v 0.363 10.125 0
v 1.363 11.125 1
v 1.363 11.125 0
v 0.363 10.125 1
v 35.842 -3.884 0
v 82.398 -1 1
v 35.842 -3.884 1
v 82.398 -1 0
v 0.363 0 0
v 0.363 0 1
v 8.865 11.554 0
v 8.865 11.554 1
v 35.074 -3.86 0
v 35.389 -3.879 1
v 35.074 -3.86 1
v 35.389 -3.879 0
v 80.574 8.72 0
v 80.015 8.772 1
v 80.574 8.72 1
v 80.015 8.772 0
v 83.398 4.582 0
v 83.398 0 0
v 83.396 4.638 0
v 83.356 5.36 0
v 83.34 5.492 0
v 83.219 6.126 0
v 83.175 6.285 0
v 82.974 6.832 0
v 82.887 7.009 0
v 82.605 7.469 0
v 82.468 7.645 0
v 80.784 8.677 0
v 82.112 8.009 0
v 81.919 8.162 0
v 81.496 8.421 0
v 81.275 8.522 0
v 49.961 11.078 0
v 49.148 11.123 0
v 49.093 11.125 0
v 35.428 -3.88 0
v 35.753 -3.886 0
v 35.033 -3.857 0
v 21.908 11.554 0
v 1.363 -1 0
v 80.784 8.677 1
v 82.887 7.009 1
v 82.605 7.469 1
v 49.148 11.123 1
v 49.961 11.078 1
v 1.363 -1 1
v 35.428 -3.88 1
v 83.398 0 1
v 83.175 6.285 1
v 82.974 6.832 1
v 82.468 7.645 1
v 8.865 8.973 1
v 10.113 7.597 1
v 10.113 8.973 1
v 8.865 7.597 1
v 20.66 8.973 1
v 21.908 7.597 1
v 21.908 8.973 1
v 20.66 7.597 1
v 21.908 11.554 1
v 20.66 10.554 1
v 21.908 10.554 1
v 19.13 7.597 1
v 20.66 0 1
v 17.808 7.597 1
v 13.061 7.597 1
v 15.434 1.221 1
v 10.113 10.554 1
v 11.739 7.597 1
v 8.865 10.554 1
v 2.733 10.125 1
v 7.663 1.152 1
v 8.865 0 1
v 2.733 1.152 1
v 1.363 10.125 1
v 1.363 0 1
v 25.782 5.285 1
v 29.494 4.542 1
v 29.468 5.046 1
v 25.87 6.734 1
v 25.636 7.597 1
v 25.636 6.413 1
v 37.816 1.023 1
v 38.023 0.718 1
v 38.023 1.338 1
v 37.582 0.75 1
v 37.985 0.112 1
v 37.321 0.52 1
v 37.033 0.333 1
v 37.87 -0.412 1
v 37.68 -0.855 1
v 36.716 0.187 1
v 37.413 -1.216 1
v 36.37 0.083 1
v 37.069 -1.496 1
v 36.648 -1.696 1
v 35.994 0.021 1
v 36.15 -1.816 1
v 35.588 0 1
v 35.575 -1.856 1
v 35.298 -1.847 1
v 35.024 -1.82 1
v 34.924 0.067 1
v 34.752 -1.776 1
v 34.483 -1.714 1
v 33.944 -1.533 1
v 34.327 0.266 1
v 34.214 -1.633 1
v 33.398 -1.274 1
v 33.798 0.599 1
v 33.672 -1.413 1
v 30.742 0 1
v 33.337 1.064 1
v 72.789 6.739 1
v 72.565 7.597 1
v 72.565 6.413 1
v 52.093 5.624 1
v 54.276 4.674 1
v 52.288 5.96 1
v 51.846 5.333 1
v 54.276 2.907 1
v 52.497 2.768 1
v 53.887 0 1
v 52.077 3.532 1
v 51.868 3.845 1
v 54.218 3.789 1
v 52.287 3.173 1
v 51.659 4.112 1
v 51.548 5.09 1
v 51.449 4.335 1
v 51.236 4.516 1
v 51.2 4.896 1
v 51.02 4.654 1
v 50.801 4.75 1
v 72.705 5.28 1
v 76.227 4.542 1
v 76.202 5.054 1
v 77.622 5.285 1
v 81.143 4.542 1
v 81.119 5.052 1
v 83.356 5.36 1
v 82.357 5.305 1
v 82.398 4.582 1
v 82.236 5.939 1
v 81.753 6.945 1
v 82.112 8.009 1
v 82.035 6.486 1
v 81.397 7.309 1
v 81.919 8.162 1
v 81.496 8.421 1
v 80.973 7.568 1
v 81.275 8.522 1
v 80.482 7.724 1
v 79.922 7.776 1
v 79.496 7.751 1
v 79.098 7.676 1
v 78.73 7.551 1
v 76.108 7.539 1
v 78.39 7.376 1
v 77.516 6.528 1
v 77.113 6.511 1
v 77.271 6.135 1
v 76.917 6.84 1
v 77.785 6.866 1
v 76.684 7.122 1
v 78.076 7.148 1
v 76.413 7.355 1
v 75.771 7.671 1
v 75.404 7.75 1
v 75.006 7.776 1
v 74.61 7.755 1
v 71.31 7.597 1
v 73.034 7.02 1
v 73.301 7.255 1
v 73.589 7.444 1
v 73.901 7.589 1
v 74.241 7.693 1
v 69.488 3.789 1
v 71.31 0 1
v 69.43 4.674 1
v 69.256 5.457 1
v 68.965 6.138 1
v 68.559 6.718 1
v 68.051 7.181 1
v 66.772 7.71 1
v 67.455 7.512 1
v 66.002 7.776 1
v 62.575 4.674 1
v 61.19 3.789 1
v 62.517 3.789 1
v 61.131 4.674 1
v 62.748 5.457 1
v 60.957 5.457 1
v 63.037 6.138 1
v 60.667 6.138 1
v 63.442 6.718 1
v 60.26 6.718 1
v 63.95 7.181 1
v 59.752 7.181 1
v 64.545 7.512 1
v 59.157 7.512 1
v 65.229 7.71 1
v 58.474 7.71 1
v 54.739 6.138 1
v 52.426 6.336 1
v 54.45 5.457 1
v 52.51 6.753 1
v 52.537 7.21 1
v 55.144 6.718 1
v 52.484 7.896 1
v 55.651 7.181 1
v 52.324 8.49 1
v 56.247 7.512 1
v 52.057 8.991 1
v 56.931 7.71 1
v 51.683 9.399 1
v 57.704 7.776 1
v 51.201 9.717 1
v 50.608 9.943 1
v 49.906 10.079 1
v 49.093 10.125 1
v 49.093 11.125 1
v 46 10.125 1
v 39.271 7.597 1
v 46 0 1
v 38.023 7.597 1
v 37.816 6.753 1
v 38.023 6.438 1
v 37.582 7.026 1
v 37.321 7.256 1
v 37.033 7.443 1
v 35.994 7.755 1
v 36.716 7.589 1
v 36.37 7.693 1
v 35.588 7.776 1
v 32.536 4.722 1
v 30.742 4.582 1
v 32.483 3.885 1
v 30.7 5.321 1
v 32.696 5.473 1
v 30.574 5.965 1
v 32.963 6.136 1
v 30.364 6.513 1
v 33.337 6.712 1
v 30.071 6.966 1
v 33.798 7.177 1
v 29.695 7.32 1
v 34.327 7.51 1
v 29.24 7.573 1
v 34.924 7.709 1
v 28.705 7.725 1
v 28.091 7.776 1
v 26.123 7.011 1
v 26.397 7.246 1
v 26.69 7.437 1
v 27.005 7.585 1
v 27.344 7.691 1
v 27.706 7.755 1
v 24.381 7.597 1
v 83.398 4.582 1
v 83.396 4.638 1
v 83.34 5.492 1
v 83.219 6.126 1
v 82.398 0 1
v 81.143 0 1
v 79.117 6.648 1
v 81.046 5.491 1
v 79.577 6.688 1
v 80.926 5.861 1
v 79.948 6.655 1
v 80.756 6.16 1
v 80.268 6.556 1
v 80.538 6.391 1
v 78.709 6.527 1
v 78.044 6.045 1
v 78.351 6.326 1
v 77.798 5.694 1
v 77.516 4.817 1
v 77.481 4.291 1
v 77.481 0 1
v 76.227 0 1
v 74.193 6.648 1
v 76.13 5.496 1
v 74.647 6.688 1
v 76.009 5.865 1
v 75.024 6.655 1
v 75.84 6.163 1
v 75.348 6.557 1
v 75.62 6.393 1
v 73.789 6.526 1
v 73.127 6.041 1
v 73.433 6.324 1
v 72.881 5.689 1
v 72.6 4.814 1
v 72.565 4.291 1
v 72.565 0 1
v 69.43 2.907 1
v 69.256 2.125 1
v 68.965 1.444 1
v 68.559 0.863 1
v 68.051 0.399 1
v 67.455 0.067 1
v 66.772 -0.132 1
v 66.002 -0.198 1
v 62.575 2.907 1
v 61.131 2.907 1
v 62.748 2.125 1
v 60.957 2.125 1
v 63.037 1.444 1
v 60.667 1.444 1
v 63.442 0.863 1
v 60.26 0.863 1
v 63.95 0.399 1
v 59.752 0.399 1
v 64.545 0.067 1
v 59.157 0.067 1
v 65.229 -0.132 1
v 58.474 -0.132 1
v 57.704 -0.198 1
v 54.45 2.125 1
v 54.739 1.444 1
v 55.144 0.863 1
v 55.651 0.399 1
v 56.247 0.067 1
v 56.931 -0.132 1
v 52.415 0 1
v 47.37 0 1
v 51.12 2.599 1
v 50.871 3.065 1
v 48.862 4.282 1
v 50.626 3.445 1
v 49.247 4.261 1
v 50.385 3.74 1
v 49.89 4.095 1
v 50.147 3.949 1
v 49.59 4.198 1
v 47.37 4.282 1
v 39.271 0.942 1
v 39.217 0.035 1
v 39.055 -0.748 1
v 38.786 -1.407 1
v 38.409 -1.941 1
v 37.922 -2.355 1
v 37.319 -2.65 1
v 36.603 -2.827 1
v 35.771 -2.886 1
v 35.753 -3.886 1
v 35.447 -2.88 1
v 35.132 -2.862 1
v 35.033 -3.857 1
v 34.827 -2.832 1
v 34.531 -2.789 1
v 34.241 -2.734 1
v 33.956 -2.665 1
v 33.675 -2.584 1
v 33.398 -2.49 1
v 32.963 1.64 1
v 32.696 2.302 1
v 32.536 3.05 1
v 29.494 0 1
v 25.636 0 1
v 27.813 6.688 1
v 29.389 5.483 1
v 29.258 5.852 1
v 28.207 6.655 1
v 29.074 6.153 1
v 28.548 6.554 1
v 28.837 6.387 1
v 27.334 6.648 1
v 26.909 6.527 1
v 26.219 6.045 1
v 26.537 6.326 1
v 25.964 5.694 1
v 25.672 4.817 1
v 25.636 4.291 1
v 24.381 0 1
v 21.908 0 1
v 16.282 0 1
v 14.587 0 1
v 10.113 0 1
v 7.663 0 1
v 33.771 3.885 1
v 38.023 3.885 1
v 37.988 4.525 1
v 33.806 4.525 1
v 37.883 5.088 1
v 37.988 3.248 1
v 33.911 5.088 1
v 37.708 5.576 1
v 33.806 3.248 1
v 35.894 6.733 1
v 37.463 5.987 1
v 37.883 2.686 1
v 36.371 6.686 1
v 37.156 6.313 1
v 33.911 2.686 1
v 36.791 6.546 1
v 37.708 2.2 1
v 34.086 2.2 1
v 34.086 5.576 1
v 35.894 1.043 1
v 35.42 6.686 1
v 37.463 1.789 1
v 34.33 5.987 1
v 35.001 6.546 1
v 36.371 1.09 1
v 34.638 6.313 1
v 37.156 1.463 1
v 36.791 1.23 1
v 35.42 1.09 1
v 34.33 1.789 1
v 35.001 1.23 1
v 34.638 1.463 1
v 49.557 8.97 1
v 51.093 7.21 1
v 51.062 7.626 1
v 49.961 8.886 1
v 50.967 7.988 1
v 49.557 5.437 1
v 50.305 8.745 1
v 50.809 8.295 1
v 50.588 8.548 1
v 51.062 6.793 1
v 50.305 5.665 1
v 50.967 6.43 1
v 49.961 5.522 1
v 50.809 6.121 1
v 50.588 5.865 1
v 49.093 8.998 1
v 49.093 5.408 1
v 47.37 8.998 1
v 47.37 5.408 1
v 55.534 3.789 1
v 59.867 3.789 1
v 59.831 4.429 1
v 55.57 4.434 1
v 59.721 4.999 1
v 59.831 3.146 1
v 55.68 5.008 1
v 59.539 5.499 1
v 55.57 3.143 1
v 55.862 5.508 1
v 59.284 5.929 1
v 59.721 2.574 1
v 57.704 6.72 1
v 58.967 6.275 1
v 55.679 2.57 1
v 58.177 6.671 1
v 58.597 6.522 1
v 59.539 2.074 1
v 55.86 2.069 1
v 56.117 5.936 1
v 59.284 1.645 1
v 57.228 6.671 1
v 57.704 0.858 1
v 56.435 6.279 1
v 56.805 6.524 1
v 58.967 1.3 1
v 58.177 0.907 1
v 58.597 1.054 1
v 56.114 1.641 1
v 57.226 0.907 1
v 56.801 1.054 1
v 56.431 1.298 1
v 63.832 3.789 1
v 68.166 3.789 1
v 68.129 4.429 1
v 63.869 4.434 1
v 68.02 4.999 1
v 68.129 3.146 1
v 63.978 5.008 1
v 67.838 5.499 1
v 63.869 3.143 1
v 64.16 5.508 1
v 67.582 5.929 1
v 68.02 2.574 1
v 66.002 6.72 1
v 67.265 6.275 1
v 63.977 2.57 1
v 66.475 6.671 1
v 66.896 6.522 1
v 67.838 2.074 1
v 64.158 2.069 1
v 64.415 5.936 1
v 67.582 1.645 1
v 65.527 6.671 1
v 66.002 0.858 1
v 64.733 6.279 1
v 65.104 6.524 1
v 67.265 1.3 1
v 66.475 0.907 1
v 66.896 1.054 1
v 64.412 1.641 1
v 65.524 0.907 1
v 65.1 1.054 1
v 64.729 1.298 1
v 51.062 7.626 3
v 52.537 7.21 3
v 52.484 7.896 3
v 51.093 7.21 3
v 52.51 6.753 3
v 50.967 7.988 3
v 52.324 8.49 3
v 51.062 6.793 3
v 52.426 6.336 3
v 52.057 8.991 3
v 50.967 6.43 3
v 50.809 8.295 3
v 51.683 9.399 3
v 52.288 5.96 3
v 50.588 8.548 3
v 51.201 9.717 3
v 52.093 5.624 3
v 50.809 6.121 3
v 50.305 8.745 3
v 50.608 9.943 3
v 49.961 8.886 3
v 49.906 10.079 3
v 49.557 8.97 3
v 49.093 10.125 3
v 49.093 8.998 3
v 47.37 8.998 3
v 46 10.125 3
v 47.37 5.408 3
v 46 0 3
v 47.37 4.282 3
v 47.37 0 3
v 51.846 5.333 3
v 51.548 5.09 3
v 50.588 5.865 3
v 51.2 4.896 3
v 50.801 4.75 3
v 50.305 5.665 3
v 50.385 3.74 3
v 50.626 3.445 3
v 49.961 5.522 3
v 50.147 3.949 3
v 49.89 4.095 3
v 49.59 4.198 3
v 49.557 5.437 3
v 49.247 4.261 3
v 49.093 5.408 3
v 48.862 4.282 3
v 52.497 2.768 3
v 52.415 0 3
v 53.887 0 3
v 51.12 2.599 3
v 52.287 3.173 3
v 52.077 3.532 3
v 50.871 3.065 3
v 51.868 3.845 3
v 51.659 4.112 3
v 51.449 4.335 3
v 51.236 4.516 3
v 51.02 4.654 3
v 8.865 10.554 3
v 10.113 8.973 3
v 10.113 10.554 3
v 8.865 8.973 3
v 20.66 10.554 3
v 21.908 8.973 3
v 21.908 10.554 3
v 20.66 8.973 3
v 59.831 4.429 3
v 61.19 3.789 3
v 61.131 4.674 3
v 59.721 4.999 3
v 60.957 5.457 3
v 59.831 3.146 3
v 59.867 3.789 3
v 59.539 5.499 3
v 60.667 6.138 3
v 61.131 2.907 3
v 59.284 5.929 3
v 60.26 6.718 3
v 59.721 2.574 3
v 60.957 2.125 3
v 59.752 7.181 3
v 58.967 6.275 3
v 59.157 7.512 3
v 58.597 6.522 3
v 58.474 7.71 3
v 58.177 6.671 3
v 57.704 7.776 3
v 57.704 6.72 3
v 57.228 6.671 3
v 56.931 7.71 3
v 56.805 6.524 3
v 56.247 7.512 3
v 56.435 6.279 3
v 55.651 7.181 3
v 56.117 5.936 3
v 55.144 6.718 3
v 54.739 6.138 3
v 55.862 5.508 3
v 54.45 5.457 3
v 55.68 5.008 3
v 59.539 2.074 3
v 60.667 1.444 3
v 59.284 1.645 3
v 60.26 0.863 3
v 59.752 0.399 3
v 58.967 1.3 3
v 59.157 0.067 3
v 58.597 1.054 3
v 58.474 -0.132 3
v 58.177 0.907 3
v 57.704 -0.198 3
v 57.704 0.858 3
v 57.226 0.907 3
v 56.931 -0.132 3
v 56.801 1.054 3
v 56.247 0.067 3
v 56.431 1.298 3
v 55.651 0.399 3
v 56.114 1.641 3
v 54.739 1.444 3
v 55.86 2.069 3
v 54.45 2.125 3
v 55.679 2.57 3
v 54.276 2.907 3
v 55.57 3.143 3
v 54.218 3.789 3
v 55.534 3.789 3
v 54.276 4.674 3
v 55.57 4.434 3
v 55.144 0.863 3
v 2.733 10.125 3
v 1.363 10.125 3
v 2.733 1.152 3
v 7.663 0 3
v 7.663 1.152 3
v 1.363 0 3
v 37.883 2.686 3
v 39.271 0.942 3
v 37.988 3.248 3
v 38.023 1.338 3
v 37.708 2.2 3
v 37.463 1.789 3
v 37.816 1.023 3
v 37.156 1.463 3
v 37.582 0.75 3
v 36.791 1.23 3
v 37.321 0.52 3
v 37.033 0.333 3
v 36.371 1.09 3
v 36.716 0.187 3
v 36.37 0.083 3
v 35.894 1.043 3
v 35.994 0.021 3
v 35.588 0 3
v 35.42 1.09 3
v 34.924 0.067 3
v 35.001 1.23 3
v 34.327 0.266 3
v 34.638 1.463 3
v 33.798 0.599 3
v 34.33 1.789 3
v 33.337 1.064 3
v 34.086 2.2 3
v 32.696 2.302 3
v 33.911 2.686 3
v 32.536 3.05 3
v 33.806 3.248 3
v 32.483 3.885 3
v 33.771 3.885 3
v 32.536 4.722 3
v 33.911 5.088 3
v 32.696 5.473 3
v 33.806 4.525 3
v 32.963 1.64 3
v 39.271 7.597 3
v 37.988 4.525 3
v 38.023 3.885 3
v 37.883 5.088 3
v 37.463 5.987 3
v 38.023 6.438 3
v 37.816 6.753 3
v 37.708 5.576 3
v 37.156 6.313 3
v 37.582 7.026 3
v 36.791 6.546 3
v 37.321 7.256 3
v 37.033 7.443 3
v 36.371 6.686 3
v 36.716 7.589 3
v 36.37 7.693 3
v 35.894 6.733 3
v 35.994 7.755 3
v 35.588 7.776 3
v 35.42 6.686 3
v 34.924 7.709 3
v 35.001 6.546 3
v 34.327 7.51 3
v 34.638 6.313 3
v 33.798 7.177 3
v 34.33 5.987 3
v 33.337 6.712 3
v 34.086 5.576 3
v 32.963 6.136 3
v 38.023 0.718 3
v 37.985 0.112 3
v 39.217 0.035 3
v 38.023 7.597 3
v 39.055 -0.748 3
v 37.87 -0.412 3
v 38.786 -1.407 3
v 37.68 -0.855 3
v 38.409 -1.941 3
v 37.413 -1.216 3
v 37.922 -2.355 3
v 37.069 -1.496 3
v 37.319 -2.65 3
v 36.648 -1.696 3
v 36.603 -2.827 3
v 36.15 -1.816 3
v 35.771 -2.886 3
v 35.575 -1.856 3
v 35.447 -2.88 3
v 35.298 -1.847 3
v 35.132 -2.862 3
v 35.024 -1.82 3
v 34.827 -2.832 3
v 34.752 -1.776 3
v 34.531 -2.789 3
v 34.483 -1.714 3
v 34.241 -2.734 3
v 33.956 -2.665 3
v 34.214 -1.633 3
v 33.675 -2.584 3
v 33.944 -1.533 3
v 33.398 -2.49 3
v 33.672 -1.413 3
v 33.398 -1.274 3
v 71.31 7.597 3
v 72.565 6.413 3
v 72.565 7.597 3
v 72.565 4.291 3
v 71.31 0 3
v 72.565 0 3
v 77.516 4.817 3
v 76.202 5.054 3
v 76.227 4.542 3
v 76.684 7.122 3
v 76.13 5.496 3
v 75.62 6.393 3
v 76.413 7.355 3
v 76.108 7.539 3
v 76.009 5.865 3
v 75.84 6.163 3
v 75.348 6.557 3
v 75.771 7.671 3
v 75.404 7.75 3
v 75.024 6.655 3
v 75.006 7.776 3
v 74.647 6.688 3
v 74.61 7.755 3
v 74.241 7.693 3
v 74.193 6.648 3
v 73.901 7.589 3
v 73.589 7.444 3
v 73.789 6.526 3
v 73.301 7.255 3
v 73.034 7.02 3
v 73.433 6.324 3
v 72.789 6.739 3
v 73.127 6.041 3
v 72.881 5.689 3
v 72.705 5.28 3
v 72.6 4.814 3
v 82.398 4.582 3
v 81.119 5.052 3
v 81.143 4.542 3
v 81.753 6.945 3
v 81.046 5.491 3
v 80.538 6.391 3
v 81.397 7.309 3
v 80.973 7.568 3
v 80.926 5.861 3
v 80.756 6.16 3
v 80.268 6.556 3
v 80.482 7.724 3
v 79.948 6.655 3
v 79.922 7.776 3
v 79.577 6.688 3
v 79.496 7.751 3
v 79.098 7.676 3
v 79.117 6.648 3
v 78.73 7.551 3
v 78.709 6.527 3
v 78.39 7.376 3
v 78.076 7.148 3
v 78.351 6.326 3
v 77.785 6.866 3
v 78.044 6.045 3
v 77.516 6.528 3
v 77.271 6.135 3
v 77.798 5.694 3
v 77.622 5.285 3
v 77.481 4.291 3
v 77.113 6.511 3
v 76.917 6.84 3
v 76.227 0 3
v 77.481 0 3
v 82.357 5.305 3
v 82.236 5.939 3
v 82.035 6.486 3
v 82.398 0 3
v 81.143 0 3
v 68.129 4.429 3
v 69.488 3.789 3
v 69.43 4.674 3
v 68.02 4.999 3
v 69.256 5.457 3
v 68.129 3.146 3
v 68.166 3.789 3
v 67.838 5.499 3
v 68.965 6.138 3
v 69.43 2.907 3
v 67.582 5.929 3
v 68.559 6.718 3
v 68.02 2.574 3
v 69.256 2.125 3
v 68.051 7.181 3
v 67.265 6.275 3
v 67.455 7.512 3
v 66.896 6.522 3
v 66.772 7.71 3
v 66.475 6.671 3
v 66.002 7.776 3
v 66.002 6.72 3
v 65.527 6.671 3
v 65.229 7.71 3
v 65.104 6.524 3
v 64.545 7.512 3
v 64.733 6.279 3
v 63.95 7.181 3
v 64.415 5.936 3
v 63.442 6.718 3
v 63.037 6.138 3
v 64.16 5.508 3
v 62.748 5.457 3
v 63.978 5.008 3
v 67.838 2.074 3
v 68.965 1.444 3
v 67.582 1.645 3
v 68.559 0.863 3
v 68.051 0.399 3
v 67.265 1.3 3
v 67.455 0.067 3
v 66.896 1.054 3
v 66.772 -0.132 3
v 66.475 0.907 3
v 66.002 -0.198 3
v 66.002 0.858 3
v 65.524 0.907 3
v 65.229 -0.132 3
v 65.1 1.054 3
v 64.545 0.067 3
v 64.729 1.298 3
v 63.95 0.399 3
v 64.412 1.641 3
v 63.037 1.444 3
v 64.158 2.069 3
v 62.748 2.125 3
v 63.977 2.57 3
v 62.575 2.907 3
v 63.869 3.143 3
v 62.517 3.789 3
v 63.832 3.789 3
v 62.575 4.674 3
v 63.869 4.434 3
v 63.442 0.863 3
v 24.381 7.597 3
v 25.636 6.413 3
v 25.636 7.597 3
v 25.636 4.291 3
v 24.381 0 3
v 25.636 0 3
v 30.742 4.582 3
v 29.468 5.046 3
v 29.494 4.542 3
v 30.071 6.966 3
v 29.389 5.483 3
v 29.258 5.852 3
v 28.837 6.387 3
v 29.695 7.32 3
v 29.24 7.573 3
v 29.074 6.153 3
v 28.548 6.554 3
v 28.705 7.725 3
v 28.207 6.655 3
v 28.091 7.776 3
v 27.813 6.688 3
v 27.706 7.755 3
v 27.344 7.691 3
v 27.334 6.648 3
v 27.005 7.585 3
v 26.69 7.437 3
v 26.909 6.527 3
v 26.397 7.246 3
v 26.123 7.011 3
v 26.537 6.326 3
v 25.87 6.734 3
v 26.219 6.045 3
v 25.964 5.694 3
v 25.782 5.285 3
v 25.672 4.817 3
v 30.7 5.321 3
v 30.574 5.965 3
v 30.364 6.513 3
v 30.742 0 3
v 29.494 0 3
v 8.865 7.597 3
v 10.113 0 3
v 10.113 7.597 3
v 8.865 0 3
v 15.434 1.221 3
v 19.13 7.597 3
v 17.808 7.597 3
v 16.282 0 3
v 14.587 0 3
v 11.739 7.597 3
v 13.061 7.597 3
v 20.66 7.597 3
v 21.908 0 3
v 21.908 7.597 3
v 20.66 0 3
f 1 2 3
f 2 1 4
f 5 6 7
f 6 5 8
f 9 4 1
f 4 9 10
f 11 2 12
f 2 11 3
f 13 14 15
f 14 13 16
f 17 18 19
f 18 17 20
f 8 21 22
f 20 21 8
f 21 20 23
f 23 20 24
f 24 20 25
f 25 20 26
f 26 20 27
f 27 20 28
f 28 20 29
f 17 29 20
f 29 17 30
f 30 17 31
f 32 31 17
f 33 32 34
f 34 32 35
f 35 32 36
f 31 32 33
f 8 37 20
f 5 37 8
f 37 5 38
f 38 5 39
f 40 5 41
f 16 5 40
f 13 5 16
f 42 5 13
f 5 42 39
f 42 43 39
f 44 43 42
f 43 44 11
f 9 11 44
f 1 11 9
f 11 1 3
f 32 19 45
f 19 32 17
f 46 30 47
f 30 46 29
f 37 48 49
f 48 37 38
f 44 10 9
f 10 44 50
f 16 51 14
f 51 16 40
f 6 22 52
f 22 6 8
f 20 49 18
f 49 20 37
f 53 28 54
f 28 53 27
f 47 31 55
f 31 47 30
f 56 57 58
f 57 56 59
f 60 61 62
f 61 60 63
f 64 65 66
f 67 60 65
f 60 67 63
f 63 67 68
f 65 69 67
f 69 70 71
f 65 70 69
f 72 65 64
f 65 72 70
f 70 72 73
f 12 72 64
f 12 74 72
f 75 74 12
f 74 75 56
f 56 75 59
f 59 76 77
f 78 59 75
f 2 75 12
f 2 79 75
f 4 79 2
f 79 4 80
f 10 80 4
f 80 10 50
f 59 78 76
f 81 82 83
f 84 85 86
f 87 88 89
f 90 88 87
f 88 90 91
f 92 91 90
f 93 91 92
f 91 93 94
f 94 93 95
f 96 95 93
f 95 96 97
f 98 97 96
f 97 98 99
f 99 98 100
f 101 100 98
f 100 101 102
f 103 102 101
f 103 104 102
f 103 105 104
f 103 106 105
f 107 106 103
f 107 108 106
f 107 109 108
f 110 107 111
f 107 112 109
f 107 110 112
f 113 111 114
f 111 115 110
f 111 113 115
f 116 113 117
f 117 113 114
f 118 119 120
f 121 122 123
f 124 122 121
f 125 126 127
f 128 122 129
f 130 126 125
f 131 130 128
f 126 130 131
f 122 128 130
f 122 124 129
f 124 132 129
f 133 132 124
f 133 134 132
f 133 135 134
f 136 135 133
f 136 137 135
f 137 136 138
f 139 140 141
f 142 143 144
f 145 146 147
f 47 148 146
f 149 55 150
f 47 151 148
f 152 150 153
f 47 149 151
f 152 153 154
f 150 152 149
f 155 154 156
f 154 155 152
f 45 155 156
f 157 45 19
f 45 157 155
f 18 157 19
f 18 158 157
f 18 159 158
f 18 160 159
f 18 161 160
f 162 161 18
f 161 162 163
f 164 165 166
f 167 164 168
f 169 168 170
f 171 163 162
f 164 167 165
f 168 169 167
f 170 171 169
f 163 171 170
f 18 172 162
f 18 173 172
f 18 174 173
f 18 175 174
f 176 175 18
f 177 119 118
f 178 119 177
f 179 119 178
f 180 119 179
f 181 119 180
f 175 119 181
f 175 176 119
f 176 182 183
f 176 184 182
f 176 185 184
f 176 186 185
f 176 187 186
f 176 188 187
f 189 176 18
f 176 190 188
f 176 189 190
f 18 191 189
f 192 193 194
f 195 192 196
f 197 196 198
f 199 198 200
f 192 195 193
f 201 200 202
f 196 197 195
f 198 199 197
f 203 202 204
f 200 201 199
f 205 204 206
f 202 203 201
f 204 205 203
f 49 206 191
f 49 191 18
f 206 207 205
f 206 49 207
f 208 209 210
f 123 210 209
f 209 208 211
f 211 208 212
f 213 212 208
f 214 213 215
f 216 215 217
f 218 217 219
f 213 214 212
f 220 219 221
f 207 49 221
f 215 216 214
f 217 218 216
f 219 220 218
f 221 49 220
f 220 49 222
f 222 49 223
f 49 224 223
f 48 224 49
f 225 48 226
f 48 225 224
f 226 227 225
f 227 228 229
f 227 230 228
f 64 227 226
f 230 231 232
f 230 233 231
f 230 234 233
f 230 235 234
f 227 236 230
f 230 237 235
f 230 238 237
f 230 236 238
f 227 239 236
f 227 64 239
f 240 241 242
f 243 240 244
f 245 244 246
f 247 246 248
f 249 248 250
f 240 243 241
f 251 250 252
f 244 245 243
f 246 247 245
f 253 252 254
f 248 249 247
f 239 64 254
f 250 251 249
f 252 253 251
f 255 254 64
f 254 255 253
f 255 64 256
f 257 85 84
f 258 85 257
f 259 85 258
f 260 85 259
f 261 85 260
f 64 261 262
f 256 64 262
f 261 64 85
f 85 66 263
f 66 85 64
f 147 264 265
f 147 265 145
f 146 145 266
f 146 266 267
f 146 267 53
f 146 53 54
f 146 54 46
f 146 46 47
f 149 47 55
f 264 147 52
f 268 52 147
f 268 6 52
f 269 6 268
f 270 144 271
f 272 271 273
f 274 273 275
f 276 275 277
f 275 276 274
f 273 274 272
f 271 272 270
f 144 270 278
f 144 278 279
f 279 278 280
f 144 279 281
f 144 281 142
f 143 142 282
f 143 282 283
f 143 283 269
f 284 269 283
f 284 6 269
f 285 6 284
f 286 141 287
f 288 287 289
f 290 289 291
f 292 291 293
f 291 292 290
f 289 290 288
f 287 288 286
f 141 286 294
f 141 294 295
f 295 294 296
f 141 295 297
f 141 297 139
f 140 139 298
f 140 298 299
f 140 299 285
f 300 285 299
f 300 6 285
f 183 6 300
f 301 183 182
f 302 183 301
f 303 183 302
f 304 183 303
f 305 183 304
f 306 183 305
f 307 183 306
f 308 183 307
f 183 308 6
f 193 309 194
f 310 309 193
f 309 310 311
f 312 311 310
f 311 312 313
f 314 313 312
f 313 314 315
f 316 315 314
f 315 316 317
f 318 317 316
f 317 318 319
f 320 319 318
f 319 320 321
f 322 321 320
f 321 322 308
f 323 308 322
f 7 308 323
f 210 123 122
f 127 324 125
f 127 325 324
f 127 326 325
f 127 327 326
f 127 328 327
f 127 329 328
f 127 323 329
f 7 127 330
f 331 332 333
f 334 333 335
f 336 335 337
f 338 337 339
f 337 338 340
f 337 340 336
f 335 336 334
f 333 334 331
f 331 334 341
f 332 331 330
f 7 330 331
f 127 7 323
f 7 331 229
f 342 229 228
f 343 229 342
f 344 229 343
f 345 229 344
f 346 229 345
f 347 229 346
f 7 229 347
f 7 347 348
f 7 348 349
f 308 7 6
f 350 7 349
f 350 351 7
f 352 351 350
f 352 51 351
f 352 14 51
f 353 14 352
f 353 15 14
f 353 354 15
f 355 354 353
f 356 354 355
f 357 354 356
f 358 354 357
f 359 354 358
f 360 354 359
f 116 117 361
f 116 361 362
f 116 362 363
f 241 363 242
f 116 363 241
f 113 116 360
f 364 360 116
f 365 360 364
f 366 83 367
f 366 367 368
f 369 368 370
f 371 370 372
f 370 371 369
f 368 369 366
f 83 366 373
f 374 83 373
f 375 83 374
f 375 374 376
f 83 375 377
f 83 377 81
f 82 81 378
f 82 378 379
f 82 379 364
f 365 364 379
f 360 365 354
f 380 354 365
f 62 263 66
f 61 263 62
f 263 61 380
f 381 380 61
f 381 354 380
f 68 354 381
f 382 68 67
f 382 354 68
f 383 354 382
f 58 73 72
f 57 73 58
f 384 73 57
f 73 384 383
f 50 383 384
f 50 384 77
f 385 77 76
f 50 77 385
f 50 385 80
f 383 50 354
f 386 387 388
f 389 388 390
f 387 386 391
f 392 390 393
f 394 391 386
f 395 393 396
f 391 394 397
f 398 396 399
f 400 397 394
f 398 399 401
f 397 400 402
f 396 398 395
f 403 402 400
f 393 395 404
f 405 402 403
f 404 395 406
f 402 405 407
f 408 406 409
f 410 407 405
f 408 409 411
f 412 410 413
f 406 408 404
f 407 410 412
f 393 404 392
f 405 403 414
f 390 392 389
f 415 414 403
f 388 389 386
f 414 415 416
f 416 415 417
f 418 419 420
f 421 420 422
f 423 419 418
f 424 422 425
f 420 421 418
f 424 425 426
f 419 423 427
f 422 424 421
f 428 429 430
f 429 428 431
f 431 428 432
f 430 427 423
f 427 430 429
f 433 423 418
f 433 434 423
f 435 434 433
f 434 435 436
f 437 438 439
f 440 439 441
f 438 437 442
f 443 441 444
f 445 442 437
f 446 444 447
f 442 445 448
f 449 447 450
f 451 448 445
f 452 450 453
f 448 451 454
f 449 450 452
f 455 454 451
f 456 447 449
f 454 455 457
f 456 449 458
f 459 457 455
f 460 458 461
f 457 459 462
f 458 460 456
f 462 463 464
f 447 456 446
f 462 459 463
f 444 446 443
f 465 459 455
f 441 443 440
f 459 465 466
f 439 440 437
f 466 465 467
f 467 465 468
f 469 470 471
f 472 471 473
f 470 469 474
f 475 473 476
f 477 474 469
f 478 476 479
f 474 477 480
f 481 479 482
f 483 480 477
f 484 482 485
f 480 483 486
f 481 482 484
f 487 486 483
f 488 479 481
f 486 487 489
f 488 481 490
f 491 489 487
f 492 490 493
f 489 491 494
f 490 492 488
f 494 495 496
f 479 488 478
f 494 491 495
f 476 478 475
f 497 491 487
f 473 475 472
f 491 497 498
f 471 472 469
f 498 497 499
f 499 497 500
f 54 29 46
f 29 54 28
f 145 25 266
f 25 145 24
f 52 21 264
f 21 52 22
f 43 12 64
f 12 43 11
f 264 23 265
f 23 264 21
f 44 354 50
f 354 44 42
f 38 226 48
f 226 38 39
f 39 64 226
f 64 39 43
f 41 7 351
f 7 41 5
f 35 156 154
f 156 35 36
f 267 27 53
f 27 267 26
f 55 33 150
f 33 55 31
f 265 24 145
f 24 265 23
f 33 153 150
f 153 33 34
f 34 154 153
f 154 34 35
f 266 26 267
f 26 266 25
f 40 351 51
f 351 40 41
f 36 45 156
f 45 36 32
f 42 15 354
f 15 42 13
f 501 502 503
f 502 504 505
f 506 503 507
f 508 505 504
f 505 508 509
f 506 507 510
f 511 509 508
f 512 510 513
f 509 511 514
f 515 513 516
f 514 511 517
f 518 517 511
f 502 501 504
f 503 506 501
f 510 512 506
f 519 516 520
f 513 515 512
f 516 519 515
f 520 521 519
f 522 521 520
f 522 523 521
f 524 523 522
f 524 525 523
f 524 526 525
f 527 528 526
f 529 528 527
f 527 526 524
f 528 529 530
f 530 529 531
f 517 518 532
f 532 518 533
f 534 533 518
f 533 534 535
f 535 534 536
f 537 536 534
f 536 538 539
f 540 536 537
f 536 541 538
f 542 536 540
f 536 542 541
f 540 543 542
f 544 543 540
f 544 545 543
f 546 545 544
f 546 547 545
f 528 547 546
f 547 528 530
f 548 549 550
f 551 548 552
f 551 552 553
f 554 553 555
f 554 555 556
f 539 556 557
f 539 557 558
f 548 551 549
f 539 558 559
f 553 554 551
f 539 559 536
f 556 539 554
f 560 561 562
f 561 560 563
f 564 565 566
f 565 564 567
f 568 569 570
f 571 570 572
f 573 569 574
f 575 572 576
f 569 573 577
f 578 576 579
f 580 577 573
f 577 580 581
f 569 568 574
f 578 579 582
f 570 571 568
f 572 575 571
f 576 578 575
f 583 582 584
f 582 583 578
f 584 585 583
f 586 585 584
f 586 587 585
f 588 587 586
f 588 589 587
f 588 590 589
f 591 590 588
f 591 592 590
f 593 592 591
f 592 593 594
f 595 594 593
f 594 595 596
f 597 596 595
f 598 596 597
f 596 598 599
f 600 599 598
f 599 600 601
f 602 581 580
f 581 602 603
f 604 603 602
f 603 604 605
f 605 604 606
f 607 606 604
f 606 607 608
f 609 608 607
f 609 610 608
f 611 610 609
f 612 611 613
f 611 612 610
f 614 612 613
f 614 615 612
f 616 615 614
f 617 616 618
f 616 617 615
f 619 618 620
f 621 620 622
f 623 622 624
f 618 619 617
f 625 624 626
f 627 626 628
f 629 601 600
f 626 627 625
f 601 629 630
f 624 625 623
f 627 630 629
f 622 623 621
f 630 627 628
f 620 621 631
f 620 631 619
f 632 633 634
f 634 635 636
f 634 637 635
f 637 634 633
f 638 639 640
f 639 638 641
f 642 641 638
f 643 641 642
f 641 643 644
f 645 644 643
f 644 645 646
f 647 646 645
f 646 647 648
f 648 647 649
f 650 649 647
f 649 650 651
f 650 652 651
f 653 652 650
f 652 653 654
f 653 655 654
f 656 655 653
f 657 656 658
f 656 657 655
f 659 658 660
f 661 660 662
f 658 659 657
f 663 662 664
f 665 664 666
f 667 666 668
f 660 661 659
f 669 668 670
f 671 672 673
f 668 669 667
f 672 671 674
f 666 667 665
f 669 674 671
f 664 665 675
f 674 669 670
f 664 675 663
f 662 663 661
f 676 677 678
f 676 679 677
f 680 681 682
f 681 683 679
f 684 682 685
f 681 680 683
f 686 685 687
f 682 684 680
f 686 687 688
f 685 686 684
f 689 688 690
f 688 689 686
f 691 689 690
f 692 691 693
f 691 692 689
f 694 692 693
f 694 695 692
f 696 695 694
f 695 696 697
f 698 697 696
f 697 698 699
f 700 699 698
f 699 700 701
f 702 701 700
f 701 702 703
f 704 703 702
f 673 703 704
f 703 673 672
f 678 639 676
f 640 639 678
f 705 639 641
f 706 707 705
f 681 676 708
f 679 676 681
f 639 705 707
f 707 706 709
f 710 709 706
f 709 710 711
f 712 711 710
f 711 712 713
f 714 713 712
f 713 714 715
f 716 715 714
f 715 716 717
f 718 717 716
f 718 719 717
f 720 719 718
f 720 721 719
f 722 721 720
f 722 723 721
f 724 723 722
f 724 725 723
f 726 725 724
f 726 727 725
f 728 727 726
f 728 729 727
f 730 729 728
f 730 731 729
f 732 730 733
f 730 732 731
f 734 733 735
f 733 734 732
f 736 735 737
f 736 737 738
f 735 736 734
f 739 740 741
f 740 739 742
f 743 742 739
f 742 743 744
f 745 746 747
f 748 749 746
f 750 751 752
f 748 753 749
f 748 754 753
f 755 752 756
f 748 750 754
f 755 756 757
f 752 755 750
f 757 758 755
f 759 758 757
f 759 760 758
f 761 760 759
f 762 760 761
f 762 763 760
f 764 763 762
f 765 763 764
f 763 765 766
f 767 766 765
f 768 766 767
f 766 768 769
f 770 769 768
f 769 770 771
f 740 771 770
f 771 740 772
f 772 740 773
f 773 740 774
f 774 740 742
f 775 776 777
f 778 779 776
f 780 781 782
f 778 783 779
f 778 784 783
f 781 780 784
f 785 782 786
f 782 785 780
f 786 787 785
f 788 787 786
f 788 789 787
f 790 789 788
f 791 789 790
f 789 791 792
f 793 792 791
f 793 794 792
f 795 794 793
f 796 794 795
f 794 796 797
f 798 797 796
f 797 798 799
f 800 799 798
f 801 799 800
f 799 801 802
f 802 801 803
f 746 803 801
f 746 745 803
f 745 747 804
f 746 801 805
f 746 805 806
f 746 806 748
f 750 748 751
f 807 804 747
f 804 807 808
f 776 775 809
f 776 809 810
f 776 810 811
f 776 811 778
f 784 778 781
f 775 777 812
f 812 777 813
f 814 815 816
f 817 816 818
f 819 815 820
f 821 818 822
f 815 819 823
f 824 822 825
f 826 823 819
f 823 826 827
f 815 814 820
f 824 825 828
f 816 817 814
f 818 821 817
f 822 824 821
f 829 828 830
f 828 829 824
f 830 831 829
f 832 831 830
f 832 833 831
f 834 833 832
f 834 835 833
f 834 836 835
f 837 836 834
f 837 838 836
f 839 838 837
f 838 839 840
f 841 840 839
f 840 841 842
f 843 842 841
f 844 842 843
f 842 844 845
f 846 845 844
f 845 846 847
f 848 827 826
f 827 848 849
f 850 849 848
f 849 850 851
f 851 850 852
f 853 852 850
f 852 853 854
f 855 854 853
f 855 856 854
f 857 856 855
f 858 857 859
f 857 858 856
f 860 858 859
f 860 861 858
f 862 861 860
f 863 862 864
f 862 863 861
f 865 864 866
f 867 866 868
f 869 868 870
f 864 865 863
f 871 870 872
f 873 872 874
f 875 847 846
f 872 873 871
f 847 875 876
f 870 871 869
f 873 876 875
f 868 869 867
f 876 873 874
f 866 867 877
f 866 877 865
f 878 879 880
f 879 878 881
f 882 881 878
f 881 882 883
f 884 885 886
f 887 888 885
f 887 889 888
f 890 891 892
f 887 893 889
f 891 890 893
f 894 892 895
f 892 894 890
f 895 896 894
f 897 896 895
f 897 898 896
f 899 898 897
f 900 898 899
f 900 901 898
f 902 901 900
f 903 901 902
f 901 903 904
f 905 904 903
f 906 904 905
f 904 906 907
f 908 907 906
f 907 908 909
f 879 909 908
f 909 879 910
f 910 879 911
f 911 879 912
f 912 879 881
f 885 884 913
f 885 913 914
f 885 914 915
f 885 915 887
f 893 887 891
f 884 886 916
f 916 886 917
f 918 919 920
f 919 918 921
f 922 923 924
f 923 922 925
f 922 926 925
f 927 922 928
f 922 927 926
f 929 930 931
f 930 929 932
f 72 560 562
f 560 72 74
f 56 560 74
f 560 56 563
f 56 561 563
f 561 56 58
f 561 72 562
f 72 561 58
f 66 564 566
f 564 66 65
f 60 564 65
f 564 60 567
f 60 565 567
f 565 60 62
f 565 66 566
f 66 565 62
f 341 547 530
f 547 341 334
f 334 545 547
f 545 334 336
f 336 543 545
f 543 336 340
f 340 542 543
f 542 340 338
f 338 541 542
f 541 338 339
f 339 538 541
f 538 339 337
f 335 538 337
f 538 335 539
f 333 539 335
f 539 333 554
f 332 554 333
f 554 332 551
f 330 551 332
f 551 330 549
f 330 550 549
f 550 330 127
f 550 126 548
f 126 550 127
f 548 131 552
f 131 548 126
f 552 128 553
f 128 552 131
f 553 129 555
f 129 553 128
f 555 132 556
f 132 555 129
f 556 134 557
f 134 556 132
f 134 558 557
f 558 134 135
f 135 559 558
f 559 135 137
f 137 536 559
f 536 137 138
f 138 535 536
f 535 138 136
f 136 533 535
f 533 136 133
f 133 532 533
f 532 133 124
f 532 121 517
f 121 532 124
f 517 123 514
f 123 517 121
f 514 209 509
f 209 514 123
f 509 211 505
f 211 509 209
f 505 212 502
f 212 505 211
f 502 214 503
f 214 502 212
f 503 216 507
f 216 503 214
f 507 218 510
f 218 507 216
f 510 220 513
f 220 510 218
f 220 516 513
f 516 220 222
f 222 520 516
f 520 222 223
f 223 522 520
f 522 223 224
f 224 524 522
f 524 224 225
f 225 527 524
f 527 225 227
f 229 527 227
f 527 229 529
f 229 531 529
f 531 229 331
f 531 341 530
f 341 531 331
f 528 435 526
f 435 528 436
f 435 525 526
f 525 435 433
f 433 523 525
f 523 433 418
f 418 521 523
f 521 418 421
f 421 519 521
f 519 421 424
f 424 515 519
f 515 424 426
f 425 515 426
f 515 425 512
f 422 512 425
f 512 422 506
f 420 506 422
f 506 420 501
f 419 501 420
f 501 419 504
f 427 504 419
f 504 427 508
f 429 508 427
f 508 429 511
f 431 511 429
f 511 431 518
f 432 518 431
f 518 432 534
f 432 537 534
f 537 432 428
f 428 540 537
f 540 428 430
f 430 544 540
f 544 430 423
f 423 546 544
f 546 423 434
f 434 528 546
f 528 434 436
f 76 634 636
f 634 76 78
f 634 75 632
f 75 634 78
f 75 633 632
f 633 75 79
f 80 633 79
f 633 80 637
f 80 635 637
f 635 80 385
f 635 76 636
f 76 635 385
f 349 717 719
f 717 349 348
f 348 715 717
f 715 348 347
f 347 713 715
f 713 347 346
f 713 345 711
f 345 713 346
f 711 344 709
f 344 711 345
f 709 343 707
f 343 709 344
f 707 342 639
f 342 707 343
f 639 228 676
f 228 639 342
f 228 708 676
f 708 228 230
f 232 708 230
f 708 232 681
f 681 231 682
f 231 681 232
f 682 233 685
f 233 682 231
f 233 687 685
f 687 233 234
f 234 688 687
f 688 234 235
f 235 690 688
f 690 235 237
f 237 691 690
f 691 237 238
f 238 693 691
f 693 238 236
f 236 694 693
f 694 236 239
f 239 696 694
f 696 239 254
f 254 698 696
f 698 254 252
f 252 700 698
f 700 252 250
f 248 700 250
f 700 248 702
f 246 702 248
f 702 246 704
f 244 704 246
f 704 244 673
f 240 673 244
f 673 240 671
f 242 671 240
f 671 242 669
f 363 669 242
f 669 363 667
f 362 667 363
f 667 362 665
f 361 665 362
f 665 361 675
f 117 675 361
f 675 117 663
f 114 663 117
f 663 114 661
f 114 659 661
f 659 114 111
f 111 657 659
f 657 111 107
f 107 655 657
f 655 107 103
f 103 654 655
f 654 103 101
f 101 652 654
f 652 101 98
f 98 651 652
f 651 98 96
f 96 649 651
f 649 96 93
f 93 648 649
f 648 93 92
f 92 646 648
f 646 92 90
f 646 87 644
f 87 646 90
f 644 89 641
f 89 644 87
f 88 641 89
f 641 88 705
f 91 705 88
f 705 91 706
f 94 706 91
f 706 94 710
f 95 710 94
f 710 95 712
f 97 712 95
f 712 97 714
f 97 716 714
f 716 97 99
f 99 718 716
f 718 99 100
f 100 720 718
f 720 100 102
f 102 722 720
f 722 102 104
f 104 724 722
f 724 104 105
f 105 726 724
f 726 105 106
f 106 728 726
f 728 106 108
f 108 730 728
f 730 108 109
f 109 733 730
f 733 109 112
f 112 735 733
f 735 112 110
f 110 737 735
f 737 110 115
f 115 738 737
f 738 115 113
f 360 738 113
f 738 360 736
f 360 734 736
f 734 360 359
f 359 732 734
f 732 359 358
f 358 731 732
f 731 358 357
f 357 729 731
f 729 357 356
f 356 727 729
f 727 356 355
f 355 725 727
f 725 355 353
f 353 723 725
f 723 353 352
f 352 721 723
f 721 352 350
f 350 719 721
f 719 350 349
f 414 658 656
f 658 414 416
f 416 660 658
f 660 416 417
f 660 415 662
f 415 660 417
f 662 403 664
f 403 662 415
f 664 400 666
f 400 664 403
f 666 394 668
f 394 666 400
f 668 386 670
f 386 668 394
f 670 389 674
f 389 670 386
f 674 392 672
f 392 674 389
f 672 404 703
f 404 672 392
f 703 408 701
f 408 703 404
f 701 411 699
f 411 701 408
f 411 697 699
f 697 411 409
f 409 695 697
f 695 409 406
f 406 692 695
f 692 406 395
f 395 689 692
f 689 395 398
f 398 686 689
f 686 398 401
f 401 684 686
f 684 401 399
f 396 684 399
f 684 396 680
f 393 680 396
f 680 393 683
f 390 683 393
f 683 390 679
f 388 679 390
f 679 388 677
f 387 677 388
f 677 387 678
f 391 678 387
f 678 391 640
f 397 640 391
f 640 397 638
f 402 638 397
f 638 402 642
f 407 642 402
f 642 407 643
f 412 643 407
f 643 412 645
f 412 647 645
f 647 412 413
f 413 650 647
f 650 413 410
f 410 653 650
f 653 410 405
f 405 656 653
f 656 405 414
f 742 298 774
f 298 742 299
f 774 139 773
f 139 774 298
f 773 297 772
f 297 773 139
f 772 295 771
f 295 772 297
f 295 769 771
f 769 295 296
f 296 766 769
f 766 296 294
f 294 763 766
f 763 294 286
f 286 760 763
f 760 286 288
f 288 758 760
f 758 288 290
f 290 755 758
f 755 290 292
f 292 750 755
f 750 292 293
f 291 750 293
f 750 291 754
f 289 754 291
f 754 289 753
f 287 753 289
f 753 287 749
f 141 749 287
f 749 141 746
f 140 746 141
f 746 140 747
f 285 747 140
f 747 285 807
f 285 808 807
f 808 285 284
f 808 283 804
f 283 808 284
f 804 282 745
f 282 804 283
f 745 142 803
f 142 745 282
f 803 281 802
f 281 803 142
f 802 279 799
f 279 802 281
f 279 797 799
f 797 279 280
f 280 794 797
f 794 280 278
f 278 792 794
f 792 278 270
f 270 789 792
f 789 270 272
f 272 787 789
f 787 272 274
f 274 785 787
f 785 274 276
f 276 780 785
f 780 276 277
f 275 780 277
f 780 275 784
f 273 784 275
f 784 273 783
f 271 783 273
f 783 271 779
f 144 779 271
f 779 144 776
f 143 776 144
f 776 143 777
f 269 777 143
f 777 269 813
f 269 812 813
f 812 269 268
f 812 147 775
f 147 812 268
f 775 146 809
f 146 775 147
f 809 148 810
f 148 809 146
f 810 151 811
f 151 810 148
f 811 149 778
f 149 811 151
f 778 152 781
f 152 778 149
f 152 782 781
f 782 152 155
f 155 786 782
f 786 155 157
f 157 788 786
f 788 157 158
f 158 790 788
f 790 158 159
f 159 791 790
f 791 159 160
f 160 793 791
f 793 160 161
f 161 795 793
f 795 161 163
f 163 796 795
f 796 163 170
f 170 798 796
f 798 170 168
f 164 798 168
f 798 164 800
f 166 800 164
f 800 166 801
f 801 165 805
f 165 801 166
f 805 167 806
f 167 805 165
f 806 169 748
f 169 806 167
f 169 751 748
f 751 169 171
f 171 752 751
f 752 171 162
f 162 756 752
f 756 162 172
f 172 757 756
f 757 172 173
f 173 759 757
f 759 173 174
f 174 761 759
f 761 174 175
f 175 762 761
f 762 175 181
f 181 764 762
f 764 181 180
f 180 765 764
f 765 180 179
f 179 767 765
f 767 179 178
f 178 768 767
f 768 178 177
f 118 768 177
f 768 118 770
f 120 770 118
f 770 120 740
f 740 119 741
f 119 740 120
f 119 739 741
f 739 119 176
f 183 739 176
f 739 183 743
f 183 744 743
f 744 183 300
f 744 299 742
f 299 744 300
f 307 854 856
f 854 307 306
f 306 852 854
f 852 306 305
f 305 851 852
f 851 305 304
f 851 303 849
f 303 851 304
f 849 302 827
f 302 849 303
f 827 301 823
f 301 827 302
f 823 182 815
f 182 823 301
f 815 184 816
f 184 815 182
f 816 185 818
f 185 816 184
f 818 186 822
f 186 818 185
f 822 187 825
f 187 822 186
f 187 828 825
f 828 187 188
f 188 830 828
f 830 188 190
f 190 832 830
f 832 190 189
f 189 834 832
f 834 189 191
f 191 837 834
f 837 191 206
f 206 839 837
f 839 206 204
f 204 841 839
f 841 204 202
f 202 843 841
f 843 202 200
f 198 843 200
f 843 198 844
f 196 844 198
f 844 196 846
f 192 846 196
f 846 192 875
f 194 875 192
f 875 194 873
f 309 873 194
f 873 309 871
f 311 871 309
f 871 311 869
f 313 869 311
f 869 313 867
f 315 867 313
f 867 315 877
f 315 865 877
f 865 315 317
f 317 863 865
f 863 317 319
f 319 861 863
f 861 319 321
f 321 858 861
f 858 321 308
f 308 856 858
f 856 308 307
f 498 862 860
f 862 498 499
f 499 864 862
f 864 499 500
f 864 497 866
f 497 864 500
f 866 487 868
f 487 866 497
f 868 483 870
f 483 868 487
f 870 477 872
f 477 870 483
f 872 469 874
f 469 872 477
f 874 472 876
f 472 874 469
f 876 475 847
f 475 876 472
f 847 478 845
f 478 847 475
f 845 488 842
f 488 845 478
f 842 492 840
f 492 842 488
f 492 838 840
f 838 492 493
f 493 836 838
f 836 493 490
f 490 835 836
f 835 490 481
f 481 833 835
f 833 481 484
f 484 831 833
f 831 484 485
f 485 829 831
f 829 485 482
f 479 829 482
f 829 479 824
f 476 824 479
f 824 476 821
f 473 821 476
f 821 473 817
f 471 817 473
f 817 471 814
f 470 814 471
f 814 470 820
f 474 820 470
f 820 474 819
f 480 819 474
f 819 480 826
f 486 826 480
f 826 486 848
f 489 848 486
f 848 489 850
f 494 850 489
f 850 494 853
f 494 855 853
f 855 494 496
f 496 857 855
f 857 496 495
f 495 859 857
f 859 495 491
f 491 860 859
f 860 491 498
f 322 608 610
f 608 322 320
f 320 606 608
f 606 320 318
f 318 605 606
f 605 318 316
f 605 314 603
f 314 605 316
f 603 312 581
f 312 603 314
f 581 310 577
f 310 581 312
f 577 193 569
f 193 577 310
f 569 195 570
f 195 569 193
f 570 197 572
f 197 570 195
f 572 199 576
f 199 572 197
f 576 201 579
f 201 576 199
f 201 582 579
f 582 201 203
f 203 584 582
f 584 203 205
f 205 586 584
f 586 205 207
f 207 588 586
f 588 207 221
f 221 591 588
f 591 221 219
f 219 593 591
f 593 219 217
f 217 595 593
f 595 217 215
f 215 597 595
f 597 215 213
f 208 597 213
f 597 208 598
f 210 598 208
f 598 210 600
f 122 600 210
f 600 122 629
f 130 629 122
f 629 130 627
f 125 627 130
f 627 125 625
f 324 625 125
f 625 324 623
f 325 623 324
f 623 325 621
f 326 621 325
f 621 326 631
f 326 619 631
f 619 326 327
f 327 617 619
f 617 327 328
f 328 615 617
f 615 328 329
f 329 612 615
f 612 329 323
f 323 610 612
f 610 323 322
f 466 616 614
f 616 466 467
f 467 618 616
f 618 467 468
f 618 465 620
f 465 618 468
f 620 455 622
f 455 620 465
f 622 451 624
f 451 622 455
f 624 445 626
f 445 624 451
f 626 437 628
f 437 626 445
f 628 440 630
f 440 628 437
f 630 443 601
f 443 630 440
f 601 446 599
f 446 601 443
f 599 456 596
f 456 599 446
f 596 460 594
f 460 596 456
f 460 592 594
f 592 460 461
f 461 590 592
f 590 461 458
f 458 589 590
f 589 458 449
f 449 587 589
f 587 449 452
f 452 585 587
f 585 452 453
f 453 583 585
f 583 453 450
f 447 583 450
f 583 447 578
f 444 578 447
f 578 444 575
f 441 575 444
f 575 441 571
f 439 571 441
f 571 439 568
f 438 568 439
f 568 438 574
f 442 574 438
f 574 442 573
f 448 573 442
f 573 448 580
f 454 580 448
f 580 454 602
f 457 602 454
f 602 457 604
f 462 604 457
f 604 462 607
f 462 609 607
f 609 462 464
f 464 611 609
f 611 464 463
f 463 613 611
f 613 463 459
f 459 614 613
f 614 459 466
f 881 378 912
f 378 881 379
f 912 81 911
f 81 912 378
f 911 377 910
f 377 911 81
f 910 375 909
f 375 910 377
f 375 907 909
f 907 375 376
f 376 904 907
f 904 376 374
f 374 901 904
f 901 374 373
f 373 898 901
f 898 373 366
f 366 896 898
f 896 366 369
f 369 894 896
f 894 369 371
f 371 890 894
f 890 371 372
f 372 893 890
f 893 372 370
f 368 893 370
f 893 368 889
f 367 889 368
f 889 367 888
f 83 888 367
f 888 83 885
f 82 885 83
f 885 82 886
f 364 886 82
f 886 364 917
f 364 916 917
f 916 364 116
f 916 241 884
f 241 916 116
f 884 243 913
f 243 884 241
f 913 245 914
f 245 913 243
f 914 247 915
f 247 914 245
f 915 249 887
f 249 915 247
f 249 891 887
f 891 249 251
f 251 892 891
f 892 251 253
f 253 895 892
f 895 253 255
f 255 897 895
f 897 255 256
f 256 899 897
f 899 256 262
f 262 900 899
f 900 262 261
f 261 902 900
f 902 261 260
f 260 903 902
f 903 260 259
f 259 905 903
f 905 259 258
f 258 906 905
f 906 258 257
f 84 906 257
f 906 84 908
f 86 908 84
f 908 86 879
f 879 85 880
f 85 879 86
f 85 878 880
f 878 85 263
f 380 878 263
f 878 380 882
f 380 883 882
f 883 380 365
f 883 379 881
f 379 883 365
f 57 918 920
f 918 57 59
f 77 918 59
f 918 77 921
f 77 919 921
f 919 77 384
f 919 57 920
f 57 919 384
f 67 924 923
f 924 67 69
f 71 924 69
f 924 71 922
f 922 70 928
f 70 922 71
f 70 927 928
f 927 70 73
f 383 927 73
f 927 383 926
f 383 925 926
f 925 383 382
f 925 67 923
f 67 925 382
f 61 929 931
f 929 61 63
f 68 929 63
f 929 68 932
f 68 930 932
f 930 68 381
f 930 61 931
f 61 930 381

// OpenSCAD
default_font = "Brush Script MT:style=Italic";
//default_font = "Chalkboard:style=Regular" ;
default_font = "Nanum Brush Script:style=Regular";

module text_on_base(txt="text", bh=1, th=2, f=default_font) {
	union() {
		linear_extrude(bh) hull() offset(r=1) text(txt, font=f);
		linear_extrude(bh+th) text(txt, font=f);
	}
}


module text_through_base(txt="text", bh=1, th=2, f=default_font) {
	difference() {
		linear_extrude(bh) hull() offset(r=1) text(txt, font=f);
		linear_extrude(bh+1) text(txt, font=f);
	}
}

text_on_base("Living Room");
//text_through_base("LIVING ROOM");
